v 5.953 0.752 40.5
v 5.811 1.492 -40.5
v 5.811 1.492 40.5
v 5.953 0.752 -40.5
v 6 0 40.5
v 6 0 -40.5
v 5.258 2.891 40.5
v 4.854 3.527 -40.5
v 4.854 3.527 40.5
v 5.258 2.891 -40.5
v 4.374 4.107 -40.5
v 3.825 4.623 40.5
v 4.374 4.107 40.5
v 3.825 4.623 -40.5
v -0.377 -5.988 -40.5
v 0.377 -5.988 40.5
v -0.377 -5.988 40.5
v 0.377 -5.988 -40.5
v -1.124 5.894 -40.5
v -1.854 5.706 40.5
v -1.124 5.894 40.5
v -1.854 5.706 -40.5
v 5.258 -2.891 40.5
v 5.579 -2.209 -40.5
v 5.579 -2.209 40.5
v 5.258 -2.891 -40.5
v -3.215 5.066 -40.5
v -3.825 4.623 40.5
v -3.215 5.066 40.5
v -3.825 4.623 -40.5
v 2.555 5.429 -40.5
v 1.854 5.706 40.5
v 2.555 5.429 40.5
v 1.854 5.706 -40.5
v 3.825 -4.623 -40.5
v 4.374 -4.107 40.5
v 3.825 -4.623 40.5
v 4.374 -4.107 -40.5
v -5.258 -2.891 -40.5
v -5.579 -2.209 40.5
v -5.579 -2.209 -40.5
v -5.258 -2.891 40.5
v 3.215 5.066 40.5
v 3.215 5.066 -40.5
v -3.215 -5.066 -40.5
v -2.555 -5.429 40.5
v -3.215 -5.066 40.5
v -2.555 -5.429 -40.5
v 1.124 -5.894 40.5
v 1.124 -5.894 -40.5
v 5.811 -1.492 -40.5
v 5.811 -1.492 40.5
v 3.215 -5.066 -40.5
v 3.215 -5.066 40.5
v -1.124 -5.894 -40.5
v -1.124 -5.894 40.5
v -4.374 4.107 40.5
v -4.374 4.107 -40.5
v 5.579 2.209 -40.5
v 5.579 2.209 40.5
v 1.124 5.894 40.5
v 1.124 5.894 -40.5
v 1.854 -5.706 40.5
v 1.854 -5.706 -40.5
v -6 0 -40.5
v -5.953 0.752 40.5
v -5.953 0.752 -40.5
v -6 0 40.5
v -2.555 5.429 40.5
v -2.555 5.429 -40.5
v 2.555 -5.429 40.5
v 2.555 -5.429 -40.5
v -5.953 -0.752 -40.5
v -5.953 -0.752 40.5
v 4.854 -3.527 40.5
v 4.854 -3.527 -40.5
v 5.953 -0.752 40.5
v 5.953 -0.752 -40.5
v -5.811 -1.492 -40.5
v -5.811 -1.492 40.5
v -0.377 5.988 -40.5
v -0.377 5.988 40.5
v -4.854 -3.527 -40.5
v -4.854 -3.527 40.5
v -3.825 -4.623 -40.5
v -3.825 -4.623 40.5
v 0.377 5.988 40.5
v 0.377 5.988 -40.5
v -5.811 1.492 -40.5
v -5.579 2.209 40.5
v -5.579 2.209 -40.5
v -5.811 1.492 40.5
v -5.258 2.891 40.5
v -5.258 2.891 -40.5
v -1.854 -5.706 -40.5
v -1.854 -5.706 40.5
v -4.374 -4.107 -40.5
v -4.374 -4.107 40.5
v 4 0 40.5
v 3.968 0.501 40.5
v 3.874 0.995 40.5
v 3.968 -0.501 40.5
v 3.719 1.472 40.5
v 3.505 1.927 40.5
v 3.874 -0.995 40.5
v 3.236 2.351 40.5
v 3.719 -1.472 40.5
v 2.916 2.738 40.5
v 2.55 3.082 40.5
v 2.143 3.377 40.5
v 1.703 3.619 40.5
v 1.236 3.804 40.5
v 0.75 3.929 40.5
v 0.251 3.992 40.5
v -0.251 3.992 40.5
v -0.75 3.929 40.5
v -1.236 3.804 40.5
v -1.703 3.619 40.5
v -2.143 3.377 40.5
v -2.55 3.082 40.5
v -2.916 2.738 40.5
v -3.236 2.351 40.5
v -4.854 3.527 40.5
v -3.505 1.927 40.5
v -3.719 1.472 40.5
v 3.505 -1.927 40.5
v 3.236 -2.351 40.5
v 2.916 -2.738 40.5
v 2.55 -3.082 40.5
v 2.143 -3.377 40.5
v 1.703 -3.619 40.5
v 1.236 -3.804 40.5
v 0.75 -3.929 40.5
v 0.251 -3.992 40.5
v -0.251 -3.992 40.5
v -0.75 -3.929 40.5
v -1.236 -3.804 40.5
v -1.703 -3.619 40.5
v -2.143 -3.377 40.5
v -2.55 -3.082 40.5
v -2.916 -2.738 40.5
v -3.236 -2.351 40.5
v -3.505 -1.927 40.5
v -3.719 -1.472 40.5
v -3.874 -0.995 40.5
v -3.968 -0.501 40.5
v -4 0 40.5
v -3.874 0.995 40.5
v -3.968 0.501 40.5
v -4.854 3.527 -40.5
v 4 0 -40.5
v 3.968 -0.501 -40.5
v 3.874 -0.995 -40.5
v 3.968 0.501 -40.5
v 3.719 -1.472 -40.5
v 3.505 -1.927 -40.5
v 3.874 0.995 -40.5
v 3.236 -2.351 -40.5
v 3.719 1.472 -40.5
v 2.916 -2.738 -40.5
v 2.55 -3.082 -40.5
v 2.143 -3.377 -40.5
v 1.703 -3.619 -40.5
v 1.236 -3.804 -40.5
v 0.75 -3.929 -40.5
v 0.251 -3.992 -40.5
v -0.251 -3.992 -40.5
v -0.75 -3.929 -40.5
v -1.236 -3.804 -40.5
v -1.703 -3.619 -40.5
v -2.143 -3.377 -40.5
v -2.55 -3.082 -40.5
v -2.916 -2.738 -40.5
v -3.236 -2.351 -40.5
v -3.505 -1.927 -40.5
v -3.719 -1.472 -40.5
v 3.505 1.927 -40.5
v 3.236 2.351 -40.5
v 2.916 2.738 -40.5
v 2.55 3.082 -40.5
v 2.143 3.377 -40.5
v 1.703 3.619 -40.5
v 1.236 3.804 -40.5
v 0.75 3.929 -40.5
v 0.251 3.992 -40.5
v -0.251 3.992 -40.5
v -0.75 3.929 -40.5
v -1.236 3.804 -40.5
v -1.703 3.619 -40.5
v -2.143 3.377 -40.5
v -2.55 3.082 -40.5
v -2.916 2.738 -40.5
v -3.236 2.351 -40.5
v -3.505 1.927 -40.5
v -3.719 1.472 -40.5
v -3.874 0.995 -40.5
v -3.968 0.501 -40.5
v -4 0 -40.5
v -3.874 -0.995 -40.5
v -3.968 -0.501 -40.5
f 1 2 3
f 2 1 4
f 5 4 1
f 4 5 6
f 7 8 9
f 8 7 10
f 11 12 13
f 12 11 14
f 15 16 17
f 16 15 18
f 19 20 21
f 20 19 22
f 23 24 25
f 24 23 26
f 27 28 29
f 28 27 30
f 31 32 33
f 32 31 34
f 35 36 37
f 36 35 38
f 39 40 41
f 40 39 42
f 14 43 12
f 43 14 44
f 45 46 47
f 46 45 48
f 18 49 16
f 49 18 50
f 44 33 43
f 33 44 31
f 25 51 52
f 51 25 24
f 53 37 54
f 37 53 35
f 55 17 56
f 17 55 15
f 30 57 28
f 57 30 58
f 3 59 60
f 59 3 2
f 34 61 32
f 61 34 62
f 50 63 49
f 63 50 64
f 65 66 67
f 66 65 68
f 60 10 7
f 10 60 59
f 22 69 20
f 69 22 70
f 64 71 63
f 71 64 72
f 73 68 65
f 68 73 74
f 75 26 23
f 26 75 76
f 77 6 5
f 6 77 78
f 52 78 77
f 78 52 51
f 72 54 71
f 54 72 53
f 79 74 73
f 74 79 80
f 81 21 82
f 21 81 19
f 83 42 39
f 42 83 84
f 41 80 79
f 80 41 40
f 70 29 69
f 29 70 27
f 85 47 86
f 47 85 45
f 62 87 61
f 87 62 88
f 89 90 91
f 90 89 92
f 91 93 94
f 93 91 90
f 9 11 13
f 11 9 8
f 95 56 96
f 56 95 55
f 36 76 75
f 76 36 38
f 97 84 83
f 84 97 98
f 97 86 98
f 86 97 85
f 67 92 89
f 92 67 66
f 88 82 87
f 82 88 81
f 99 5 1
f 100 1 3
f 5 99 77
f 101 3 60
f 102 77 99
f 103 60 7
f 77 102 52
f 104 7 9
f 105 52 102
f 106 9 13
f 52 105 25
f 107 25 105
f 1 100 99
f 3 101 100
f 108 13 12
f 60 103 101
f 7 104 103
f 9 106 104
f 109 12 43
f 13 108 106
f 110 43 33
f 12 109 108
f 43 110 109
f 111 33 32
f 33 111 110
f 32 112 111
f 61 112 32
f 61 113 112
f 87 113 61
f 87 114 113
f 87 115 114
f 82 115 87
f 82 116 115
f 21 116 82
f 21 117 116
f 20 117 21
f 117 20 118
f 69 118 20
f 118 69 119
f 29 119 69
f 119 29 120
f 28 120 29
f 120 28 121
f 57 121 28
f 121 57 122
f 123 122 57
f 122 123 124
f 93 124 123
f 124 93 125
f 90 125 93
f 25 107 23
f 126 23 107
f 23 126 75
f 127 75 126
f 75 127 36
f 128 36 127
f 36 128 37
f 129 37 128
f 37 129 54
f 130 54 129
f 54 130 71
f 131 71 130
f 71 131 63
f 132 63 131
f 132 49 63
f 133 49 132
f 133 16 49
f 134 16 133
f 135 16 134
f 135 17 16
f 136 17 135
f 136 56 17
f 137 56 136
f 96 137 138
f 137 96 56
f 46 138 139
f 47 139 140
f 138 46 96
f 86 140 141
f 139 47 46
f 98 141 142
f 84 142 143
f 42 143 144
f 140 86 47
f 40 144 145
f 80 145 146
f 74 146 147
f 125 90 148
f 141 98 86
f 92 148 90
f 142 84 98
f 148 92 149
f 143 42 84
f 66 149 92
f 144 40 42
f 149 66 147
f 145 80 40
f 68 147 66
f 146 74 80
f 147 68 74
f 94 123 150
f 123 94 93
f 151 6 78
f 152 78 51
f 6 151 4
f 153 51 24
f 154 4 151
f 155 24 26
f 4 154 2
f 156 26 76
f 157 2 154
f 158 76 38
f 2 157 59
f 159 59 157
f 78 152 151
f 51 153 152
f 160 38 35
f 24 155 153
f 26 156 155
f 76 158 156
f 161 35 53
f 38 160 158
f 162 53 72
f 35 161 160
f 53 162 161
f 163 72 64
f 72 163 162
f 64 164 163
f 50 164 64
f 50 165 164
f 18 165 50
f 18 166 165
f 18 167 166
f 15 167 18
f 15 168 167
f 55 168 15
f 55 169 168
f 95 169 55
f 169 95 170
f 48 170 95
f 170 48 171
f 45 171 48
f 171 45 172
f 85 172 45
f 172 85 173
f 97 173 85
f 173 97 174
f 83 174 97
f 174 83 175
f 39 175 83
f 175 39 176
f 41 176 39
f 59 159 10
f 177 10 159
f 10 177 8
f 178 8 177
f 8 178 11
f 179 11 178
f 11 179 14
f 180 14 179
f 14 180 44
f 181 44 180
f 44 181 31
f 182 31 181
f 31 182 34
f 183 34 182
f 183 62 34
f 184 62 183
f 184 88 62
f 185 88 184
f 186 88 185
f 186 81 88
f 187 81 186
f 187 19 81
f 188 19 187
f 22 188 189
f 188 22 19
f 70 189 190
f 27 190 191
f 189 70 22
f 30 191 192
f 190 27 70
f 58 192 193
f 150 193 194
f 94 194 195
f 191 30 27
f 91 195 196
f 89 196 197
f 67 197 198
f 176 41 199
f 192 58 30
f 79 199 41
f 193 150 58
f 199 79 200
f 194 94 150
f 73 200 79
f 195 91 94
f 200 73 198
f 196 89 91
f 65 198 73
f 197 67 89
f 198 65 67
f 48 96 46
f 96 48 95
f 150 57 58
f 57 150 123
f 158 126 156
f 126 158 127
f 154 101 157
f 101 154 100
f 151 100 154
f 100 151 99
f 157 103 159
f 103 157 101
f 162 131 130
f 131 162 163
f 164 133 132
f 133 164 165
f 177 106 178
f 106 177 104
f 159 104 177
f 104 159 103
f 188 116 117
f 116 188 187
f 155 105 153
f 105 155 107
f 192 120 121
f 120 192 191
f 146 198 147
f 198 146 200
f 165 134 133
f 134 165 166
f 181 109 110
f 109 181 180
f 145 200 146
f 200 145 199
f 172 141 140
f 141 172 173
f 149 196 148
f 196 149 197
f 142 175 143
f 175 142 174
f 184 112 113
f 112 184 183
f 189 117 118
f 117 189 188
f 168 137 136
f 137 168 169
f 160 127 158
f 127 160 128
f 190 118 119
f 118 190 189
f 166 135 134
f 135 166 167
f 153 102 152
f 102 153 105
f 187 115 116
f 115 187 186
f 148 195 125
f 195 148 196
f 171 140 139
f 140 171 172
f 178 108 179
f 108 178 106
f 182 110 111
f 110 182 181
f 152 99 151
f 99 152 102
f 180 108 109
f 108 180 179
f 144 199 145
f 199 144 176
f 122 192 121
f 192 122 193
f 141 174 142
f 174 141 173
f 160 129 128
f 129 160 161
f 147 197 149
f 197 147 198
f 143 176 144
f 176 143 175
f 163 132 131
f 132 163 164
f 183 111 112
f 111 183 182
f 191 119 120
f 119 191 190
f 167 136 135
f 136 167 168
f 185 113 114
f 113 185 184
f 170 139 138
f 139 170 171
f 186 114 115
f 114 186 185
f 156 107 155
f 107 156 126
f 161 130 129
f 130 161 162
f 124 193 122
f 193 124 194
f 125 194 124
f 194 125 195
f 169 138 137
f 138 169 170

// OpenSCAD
$fn = 50;


difference() {
	union() {
		translate(v = [0, 0, -40.5000000000]) {
			cylinder(h = 81, r = 6.0000000000);
		}
	}
	union() {
		translate(v = [0, 0, -100.0000000000]) {
			cylinder(h = 200, r = 4.0000000000);
		}
	}
}
